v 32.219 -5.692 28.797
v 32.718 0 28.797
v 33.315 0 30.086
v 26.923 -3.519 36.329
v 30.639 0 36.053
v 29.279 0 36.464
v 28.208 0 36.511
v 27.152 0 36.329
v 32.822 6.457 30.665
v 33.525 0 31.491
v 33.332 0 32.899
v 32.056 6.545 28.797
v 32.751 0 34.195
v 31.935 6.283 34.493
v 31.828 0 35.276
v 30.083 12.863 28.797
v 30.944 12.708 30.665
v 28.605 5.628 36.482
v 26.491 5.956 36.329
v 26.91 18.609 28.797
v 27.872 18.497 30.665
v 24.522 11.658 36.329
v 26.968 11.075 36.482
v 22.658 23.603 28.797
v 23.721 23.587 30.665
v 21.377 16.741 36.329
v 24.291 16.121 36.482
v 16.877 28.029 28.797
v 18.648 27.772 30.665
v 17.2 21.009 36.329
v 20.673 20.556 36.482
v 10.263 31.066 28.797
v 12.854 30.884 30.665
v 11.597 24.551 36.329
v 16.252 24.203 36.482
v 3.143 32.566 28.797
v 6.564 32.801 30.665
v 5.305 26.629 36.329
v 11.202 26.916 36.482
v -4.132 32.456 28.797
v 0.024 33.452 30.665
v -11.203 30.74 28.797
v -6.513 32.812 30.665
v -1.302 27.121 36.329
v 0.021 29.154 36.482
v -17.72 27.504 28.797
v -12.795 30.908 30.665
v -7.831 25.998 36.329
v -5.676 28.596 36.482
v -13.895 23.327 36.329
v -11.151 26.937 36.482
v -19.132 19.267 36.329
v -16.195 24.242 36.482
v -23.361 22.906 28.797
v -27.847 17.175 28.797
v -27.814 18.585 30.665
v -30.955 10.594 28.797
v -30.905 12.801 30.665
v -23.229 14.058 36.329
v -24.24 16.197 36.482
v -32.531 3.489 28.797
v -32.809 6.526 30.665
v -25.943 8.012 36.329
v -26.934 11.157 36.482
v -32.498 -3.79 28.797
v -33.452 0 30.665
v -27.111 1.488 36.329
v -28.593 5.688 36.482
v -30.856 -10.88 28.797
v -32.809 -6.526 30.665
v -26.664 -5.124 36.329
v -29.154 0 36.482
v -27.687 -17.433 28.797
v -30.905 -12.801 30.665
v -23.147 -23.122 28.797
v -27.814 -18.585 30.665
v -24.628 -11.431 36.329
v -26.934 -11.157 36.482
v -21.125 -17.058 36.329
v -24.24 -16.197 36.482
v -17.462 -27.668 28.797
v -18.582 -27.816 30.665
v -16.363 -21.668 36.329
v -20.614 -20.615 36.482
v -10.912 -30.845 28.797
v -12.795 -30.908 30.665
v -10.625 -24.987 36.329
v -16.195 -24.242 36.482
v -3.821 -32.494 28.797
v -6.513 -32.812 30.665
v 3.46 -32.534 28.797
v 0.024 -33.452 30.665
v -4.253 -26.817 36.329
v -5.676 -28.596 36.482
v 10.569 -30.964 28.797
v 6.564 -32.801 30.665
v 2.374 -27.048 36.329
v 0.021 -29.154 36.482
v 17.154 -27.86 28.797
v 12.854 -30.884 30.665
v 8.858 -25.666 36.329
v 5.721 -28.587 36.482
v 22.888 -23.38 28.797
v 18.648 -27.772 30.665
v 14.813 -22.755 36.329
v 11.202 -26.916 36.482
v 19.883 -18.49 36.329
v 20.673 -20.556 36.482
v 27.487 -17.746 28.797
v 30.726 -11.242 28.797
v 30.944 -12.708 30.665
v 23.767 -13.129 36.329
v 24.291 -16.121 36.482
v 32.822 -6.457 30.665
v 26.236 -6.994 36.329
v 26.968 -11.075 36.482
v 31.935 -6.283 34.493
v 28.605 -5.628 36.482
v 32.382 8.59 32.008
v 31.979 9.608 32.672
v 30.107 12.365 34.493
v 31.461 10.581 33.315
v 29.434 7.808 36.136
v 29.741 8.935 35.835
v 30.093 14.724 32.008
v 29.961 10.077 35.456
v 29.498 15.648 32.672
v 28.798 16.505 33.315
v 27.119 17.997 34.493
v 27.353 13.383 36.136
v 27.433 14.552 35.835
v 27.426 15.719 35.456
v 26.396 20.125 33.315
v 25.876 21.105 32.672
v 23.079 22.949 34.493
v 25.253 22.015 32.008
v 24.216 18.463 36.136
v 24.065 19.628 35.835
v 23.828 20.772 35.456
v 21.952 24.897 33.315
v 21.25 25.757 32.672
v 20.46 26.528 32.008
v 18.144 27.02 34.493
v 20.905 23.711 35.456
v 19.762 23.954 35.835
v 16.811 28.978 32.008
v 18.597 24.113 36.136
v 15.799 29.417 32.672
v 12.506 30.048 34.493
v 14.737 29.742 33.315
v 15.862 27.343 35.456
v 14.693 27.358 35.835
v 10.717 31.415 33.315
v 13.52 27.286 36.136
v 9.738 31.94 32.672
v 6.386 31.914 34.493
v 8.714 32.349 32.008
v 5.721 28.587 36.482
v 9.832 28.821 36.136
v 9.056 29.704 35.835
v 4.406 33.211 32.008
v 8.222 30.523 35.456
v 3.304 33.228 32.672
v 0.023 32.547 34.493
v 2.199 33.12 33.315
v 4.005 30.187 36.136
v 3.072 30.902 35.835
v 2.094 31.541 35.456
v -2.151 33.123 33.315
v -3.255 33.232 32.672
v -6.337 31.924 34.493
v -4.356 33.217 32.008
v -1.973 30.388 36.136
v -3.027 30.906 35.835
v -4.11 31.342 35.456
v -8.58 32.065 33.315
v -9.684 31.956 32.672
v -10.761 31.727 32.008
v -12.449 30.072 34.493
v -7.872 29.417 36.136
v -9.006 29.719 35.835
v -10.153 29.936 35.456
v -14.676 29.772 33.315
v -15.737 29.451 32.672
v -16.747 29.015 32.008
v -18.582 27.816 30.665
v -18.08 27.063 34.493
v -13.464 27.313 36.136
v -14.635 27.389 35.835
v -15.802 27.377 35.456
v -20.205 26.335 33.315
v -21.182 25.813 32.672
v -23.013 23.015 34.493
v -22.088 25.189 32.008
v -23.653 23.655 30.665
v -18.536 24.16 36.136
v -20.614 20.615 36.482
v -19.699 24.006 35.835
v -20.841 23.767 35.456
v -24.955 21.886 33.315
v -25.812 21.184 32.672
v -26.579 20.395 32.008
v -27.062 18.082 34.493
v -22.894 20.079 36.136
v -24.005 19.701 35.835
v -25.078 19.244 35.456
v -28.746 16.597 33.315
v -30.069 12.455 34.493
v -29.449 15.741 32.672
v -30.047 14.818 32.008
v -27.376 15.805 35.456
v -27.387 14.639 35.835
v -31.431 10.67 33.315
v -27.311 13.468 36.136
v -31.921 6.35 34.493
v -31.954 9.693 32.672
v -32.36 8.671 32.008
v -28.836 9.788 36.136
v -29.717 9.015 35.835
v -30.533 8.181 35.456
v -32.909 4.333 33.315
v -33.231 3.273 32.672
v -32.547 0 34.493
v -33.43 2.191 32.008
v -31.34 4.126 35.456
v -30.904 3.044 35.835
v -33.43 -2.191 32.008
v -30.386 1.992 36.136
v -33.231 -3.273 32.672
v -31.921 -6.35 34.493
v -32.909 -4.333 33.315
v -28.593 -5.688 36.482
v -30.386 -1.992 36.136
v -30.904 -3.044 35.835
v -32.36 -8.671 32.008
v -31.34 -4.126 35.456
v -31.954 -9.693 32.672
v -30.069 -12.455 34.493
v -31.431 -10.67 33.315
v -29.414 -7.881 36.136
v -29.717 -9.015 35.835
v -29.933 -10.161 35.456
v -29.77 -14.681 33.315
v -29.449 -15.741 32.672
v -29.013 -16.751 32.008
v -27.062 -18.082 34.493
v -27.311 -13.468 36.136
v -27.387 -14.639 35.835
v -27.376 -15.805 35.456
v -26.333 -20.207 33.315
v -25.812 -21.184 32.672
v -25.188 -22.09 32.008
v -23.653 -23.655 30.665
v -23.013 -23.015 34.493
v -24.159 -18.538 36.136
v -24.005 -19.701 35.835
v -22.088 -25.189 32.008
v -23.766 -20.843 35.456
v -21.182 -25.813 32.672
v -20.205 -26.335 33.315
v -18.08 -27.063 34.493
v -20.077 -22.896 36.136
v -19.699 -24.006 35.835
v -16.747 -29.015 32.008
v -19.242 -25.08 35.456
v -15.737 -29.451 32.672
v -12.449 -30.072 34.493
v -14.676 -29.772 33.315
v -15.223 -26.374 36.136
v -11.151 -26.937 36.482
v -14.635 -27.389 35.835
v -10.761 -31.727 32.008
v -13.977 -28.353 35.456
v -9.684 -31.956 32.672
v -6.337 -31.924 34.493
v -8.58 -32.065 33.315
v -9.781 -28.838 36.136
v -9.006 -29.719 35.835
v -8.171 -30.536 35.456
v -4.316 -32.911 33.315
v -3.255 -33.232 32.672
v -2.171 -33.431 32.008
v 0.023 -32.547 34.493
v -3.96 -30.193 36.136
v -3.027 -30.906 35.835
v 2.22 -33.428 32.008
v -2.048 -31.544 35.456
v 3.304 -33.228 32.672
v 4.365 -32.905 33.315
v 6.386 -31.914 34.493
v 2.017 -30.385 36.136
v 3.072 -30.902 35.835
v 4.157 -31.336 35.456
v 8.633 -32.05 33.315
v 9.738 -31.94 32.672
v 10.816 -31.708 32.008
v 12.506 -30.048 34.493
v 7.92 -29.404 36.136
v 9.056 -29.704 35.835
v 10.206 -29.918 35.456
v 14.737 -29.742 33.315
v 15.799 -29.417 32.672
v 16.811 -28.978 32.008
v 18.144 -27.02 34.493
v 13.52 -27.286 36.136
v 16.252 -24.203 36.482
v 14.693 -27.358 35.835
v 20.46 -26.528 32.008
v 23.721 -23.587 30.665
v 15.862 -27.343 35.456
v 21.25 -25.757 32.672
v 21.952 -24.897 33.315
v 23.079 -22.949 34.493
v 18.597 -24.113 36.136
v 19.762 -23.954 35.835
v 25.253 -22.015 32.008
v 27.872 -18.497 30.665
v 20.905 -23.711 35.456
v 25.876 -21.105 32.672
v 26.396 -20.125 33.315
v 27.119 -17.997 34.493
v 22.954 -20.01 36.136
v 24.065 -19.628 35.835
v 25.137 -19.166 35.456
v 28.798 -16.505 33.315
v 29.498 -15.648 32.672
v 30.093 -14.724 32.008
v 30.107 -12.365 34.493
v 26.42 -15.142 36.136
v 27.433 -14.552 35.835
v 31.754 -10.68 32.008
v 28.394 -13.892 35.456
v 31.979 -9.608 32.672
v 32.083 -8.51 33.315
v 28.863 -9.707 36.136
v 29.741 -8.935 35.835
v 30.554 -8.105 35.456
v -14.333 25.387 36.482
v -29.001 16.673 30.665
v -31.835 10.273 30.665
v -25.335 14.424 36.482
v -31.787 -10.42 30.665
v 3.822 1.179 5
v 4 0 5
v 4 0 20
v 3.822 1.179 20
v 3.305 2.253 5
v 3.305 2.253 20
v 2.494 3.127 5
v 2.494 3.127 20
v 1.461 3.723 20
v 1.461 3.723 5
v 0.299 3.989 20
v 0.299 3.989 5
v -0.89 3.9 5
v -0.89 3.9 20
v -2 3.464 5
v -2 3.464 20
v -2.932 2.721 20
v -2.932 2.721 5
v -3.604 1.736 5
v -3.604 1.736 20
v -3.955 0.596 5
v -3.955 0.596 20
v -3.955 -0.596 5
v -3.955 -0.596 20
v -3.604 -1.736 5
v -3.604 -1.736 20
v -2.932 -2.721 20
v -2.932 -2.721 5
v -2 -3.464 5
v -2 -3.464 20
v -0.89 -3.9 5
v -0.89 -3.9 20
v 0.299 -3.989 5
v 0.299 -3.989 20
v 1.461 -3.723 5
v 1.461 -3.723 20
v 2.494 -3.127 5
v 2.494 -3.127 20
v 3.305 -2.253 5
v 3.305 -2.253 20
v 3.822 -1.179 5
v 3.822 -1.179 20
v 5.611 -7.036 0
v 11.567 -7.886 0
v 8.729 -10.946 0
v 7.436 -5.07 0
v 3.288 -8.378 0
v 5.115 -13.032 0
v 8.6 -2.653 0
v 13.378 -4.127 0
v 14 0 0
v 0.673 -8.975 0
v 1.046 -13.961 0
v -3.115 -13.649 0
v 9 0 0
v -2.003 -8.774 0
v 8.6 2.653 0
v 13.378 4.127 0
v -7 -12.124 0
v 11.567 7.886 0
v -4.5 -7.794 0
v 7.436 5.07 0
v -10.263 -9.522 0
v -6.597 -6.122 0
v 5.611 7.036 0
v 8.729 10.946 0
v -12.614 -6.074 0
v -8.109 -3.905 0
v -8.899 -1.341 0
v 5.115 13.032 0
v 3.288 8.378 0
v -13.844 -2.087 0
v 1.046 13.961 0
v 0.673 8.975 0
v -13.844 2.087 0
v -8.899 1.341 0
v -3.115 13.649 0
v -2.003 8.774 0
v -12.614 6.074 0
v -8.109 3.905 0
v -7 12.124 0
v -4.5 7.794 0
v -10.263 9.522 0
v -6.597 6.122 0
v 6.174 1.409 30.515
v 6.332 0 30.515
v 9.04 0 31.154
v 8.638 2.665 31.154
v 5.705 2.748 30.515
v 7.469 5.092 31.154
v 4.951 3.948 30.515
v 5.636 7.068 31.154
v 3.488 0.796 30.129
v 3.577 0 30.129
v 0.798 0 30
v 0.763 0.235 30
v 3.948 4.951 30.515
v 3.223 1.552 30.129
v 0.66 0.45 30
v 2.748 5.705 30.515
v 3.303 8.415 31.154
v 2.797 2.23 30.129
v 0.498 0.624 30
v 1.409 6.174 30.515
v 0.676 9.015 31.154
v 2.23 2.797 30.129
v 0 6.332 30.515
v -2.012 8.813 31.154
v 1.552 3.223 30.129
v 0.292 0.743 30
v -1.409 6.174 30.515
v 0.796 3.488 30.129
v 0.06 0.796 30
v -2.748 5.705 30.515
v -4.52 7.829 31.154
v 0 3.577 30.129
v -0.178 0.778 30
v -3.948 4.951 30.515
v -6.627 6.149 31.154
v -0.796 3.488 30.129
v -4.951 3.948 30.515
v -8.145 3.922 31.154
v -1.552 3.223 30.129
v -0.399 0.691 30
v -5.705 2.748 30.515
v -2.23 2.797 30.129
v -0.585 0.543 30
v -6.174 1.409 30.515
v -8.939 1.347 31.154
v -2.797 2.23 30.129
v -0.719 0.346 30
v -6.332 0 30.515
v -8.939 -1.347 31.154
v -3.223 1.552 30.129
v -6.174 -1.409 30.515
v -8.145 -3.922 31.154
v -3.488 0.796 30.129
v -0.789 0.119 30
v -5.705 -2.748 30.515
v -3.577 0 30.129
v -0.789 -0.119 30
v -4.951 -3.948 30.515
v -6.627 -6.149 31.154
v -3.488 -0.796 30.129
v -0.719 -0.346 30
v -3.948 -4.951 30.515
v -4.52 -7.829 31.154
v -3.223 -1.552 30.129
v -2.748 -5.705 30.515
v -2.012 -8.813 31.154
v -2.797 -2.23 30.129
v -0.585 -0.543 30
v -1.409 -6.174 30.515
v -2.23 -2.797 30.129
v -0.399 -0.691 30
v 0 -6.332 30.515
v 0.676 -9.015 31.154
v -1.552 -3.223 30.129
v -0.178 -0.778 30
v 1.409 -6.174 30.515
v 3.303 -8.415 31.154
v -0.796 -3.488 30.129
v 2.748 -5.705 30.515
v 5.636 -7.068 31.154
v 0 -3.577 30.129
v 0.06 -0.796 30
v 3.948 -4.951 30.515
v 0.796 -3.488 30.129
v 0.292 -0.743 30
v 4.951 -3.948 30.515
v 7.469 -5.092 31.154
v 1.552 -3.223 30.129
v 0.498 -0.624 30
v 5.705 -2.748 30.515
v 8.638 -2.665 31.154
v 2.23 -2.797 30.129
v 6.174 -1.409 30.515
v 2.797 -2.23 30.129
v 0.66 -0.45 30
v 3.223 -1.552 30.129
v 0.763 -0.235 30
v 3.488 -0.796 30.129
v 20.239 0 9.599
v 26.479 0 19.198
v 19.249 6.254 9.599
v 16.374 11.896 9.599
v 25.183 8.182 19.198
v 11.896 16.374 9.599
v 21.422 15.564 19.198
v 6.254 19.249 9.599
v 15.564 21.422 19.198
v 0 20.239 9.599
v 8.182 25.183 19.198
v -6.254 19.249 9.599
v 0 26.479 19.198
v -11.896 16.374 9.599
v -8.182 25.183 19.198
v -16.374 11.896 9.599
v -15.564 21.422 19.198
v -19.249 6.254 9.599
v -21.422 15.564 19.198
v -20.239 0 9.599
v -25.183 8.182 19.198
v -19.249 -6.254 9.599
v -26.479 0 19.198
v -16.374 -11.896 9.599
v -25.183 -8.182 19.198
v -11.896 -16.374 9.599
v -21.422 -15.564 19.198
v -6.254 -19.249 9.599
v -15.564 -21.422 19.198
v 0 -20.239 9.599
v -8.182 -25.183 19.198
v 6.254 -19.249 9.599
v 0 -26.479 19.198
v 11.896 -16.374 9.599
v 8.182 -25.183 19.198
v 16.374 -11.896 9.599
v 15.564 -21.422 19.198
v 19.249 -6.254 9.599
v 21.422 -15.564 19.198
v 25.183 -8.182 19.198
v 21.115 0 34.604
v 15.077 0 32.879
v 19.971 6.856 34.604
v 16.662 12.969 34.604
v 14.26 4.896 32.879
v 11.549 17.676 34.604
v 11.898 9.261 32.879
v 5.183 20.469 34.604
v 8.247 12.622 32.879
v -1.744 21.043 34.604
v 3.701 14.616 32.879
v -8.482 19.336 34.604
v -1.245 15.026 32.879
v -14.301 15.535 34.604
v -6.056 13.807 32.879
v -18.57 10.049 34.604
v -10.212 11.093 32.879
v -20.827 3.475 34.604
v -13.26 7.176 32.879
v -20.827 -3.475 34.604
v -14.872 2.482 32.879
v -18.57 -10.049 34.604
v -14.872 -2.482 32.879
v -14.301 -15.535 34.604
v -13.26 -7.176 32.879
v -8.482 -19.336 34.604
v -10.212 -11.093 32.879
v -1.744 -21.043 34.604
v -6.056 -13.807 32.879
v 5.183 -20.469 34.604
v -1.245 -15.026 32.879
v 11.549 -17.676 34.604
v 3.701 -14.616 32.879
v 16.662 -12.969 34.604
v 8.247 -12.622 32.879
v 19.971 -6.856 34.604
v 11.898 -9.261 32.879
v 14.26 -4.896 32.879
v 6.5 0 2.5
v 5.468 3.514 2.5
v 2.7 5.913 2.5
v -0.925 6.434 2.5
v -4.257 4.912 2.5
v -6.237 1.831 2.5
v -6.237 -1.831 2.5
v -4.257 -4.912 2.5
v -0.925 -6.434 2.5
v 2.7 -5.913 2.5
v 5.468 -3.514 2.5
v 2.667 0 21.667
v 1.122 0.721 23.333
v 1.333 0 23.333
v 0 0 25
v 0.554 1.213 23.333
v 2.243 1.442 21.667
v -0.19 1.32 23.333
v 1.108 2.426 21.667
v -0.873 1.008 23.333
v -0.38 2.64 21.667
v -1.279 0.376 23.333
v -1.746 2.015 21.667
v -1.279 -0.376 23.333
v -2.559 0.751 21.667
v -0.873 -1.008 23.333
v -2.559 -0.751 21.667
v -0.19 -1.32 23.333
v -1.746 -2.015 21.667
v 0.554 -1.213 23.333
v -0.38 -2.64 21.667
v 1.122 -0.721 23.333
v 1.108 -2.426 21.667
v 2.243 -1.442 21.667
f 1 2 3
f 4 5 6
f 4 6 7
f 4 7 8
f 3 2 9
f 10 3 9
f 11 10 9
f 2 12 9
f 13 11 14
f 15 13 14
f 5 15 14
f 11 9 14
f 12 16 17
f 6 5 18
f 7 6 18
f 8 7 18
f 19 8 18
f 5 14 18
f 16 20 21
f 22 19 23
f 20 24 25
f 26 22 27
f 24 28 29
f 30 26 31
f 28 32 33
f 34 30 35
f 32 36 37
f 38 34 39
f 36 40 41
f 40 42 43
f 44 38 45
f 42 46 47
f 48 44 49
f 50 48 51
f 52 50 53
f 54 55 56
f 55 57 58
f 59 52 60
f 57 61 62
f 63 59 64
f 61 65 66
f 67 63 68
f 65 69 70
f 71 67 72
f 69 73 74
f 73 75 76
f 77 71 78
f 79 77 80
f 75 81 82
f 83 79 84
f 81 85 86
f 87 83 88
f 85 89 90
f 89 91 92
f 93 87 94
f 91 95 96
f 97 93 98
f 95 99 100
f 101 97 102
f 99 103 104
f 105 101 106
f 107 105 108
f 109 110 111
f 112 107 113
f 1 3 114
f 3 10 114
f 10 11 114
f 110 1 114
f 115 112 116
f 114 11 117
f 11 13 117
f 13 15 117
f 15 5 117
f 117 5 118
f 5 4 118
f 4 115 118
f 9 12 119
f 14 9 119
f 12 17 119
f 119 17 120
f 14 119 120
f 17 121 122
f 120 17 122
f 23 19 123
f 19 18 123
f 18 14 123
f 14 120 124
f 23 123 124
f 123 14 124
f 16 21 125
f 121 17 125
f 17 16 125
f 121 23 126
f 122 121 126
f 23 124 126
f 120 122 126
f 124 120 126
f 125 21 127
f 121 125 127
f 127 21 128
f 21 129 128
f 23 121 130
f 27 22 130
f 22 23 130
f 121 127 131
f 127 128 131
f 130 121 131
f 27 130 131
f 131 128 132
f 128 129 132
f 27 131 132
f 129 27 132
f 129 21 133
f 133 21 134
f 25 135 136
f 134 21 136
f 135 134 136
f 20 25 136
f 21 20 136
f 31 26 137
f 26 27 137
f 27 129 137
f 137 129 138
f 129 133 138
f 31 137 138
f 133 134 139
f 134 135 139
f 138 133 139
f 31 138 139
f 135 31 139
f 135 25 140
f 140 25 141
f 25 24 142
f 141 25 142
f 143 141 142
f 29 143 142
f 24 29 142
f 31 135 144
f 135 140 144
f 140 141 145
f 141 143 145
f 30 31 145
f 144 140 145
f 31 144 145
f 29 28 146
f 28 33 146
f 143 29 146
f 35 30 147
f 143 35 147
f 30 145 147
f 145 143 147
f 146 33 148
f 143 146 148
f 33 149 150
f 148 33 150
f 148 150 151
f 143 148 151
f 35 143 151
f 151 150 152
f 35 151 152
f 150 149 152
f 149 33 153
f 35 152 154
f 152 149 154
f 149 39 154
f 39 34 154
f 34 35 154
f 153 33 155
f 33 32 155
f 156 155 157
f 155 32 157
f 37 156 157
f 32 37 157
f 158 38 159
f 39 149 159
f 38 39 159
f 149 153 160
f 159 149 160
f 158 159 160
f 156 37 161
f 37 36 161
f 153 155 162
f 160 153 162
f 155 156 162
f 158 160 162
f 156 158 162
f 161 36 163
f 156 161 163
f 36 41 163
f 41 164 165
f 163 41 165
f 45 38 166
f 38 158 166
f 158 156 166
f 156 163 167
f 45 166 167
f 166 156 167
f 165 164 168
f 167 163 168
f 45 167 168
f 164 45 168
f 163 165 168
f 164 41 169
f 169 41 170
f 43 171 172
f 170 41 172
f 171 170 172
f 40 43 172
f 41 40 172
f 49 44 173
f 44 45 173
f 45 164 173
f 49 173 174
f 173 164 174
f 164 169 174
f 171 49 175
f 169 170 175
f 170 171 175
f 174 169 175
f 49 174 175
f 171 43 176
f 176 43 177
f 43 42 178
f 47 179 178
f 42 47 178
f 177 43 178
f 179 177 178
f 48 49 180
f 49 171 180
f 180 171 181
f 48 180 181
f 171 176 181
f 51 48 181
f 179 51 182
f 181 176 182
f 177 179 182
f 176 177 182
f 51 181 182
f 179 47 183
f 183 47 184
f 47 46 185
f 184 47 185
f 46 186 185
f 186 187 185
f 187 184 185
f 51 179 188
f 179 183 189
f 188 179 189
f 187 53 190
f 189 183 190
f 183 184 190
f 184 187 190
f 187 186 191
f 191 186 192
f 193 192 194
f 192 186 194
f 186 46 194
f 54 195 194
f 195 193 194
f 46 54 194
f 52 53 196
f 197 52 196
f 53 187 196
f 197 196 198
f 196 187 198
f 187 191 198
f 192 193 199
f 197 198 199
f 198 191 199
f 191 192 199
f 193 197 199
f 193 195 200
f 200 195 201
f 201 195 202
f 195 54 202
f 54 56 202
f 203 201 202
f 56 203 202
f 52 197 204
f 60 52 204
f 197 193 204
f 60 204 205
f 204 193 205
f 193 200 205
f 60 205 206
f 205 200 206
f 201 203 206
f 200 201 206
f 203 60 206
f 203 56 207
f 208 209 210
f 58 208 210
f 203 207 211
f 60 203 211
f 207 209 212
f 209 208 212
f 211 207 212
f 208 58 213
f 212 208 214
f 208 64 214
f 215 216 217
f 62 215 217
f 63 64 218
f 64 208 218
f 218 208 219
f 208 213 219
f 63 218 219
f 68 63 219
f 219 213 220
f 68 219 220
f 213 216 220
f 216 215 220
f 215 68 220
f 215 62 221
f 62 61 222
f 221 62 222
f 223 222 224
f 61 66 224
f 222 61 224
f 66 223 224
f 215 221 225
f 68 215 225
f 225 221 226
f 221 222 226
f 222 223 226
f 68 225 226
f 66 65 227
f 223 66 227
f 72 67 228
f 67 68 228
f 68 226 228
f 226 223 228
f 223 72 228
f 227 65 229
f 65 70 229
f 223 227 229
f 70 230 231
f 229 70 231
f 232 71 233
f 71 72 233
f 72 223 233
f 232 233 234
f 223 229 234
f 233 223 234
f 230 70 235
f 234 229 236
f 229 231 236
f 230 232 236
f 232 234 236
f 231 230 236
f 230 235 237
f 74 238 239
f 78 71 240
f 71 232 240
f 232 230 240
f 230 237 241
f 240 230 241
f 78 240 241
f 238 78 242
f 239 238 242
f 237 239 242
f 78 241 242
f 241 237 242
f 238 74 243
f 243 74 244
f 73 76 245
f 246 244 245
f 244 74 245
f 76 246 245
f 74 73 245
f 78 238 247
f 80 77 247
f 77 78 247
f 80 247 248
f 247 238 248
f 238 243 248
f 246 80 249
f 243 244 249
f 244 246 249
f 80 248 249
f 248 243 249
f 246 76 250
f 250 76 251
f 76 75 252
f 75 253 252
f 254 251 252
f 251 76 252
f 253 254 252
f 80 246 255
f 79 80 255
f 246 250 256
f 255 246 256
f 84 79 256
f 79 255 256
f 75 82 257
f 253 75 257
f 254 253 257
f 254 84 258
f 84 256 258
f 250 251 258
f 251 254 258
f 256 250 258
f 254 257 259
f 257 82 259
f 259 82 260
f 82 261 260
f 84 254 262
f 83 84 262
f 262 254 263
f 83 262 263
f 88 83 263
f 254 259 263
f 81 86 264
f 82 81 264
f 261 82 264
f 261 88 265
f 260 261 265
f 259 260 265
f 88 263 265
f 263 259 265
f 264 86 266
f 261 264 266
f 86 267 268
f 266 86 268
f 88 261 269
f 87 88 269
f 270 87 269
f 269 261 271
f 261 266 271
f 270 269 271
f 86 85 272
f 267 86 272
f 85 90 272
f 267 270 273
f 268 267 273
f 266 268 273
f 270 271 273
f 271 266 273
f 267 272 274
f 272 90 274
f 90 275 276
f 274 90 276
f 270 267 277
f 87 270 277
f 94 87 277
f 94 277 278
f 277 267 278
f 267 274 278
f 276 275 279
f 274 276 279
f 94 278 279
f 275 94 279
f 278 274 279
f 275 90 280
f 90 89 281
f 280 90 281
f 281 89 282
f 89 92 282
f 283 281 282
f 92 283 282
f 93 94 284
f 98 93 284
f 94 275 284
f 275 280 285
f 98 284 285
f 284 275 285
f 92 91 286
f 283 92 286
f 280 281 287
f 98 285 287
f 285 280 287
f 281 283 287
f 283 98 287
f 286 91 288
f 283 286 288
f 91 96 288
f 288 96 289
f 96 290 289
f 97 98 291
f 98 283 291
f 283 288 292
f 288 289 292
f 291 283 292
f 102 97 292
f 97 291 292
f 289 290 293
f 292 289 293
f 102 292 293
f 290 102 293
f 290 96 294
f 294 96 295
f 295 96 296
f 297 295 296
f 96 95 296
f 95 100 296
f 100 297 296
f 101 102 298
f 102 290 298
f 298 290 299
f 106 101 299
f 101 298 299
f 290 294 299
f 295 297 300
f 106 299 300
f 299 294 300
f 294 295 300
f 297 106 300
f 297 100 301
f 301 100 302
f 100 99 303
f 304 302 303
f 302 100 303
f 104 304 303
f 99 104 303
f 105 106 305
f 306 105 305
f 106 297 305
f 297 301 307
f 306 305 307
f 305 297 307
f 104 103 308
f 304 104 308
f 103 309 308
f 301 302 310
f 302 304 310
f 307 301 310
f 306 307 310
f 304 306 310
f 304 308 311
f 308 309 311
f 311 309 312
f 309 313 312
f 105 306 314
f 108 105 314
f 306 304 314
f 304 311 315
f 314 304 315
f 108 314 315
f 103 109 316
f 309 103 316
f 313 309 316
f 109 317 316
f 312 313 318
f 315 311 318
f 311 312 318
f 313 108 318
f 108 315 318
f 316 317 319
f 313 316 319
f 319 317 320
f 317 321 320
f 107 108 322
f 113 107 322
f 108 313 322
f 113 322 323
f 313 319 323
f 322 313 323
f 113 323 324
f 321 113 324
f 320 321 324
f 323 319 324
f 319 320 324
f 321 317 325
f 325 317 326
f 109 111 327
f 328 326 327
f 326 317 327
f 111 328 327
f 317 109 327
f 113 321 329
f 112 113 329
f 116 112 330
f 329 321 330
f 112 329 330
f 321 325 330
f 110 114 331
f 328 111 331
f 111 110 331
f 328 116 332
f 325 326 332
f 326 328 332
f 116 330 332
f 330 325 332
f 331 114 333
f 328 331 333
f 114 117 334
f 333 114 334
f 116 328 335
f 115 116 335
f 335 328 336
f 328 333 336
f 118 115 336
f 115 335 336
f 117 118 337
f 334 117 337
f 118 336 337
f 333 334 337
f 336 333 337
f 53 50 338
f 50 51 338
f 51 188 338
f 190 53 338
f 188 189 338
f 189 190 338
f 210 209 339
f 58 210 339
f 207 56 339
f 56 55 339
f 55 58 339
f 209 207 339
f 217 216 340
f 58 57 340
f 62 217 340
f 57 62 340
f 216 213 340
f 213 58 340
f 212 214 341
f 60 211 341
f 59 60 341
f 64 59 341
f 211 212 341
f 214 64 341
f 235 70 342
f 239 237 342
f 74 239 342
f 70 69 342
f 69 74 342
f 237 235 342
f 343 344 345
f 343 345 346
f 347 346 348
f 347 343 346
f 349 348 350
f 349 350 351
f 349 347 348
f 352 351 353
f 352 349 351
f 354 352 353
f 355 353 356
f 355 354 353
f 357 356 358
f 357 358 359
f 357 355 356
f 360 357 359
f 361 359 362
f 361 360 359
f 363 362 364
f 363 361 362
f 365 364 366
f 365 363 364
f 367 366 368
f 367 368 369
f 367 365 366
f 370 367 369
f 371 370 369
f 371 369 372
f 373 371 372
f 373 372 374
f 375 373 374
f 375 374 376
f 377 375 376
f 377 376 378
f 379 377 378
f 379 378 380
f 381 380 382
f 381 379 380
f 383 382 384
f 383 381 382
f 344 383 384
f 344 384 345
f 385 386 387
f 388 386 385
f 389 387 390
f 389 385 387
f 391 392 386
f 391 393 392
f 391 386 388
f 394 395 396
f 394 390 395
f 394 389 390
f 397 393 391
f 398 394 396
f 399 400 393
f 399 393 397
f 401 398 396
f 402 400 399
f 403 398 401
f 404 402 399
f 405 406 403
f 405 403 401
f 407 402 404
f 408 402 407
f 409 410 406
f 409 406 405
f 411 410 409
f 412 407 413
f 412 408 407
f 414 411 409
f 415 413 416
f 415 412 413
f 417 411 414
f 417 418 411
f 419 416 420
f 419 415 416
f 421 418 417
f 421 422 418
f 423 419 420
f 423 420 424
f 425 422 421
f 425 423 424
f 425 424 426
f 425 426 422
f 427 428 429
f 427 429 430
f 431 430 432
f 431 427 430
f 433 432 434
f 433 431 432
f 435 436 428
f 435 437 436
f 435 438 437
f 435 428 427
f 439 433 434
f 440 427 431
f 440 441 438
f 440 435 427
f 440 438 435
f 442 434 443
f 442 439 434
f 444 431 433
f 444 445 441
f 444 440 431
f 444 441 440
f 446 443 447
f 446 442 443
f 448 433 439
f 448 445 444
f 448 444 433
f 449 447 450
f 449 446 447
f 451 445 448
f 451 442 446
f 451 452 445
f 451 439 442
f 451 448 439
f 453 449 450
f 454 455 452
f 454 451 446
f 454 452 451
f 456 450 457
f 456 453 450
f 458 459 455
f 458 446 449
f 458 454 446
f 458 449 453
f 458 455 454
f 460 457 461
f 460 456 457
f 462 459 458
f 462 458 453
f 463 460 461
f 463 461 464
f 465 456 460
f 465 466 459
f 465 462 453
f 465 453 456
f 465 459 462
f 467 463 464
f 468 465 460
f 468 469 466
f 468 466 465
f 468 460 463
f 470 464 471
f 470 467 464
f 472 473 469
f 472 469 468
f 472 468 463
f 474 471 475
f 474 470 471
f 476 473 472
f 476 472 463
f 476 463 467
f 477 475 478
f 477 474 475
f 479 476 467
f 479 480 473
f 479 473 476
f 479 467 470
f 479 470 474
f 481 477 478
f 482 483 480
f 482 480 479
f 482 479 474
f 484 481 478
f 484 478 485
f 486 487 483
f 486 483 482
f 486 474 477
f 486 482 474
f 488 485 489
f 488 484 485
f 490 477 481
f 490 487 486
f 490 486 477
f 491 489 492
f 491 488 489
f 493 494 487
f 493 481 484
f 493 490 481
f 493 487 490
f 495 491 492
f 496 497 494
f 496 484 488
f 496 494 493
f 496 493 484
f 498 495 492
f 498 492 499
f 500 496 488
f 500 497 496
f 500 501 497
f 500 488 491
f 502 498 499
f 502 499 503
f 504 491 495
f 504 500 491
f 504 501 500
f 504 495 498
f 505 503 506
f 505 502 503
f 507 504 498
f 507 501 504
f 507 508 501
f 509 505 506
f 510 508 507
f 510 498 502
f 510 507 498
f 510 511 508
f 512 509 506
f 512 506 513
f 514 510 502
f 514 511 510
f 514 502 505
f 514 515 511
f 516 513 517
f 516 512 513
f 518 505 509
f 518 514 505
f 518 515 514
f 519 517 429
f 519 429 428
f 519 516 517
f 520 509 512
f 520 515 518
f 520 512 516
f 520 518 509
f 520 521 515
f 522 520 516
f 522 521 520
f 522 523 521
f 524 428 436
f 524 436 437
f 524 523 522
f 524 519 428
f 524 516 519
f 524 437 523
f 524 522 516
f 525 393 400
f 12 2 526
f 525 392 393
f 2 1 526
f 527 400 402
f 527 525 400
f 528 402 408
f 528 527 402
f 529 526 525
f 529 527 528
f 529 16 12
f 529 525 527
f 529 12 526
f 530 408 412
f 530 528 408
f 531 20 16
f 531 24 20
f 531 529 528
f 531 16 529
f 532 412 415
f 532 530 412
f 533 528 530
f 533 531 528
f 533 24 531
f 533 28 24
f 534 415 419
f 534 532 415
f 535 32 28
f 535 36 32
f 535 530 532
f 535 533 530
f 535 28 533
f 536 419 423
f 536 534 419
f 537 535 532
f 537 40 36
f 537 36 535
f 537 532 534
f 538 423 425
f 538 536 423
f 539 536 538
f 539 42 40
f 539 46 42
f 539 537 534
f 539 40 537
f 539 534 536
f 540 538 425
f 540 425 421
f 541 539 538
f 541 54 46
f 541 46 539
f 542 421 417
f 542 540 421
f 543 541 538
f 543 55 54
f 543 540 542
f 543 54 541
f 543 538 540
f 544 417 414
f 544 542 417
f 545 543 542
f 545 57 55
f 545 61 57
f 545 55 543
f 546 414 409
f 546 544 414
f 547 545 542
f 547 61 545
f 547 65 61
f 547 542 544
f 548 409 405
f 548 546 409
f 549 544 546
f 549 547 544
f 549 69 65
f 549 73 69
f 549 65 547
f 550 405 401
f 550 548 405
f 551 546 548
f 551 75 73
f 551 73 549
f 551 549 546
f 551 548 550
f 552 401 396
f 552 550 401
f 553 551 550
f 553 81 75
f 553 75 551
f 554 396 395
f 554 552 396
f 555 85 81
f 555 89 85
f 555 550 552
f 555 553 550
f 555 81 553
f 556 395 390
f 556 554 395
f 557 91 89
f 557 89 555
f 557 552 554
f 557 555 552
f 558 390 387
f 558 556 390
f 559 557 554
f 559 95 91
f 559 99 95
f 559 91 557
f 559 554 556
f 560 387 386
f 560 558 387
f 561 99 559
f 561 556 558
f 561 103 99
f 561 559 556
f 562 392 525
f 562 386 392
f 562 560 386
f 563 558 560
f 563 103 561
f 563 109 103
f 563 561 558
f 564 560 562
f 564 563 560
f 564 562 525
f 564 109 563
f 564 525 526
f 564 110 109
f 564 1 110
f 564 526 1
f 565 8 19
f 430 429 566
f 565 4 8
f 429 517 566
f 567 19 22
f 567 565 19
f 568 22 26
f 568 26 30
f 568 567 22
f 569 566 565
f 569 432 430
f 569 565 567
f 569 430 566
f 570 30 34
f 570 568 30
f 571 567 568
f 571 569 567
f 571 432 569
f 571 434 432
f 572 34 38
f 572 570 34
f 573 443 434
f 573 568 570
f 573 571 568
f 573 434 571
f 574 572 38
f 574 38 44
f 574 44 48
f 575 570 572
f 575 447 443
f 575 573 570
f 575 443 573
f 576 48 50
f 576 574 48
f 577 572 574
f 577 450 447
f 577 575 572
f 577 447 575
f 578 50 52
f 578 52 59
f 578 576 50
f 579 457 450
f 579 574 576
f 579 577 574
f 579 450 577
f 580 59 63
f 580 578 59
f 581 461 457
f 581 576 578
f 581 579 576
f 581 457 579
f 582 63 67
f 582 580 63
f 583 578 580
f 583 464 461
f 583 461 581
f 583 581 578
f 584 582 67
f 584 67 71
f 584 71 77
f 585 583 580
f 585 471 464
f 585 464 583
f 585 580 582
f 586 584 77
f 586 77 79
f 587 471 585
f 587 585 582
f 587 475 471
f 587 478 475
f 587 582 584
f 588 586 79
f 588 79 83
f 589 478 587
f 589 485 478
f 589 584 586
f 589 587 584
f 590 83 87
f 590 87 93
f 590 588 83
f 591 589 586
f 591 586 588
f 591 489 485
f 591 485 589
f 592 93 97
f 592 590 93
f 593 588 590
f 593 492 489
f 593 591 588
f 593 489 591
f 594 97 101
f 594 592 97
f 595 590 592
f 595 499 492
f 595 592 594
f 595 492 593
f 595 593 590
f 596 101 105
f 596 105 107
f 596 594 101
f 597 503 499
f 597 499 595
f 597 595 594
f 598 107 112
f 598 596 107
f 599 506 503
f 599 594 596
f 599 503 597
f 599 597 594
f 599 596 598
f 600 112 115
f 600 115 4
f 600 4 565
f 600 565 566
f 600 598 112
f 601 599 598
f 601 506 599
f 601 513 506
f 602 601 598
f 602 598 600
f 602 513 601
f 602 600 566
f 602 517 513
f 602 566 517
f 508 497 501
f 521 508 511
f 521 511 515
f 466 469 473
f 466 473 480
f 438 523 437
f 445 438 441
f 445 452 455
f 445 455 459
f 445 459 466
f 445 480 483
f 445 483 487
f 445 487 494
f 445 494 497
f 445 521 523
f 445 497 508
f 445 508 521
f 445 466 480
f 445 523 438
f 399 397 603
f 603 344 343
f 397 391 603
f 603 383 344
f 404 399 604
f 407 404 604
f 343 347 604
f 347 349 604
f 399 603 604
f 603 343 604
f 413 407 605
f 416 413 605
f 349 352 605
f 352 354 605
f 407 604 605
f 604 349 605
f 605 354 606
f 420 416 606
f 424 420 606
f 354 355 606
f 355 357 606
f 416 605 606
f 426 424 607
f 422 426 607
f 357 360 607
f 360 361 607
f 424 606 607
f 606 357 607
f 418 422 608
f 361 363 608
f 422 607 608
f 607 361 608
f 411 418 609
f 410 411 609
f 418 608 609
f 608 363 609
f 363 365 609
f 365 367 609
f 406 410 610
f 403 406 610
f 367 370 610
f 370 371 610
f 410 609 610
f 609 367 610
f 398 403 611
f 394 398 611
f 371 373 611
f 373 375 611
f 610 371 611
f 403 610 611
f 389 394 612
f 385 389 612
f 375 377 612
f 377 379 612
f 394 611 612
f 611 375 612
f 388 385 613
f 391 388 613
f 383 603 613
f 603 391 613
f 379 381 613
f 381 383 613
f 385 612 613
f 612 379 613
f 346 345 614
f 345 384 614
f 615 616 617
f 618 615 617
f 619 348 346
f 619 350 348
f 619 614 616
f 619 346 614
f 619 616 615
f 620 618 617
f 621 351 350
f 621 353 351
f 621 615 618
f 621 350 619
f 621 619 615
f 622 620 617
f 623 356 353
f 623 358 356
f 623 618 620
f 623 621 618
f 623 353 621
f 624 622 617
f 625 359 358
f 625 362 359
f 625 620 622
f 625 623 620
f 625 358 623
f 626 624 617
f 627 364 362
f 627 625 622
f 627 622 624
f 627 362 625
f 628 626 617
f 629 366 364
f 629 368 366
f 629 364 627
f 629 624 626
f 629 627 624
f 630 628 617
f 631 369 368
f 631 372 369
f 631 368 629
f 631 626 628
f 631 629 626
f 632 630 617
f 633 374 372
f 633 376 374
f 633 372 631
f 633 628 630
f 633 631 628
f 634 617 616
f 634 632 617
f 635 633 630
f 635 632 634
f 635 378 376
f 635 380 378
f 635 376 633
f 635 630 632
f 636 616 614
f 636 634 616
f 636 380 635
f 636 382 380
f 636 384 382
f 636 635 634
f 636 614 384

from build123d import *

# Parameters (mm, degrees)
F2_R    = 5
F3_R    = 30
F4_SIZE = 5


with BuildPart() as f1:
    # F0 (on Front) → F1 (revolve)
    with BuildSketch(Plane.XZ):
        Polygon((4, 20), (4, 0), (14, 0), (40, 40), (5, 30), (0, 30), (0, 25), align=None)
    revolve(axis=Axis((0, 0, 22.69237), (0, 0, 1)))

    # F2
    f2_edges = [f1.edges().sort_by_distance(p)[0] for p in [
        (-40, 0, 40),
    ]]
    fillet(f2_edges, radius=F2_R)

    # F3
    f3_edges = [f1.edges().sort_by_distance(p)[0] for p in [
        (-5, 0, 30),
    ]]
    fillet(f3_edges, radius=F3_R)

    # F4
    f4_edges = [f1.edges().sort_by_distance(p)[0] for p in [
        (-4, 0, 0),
    ]]
    chamfer(f4_edges, length=F4_SIZE)


solid = f1.part
